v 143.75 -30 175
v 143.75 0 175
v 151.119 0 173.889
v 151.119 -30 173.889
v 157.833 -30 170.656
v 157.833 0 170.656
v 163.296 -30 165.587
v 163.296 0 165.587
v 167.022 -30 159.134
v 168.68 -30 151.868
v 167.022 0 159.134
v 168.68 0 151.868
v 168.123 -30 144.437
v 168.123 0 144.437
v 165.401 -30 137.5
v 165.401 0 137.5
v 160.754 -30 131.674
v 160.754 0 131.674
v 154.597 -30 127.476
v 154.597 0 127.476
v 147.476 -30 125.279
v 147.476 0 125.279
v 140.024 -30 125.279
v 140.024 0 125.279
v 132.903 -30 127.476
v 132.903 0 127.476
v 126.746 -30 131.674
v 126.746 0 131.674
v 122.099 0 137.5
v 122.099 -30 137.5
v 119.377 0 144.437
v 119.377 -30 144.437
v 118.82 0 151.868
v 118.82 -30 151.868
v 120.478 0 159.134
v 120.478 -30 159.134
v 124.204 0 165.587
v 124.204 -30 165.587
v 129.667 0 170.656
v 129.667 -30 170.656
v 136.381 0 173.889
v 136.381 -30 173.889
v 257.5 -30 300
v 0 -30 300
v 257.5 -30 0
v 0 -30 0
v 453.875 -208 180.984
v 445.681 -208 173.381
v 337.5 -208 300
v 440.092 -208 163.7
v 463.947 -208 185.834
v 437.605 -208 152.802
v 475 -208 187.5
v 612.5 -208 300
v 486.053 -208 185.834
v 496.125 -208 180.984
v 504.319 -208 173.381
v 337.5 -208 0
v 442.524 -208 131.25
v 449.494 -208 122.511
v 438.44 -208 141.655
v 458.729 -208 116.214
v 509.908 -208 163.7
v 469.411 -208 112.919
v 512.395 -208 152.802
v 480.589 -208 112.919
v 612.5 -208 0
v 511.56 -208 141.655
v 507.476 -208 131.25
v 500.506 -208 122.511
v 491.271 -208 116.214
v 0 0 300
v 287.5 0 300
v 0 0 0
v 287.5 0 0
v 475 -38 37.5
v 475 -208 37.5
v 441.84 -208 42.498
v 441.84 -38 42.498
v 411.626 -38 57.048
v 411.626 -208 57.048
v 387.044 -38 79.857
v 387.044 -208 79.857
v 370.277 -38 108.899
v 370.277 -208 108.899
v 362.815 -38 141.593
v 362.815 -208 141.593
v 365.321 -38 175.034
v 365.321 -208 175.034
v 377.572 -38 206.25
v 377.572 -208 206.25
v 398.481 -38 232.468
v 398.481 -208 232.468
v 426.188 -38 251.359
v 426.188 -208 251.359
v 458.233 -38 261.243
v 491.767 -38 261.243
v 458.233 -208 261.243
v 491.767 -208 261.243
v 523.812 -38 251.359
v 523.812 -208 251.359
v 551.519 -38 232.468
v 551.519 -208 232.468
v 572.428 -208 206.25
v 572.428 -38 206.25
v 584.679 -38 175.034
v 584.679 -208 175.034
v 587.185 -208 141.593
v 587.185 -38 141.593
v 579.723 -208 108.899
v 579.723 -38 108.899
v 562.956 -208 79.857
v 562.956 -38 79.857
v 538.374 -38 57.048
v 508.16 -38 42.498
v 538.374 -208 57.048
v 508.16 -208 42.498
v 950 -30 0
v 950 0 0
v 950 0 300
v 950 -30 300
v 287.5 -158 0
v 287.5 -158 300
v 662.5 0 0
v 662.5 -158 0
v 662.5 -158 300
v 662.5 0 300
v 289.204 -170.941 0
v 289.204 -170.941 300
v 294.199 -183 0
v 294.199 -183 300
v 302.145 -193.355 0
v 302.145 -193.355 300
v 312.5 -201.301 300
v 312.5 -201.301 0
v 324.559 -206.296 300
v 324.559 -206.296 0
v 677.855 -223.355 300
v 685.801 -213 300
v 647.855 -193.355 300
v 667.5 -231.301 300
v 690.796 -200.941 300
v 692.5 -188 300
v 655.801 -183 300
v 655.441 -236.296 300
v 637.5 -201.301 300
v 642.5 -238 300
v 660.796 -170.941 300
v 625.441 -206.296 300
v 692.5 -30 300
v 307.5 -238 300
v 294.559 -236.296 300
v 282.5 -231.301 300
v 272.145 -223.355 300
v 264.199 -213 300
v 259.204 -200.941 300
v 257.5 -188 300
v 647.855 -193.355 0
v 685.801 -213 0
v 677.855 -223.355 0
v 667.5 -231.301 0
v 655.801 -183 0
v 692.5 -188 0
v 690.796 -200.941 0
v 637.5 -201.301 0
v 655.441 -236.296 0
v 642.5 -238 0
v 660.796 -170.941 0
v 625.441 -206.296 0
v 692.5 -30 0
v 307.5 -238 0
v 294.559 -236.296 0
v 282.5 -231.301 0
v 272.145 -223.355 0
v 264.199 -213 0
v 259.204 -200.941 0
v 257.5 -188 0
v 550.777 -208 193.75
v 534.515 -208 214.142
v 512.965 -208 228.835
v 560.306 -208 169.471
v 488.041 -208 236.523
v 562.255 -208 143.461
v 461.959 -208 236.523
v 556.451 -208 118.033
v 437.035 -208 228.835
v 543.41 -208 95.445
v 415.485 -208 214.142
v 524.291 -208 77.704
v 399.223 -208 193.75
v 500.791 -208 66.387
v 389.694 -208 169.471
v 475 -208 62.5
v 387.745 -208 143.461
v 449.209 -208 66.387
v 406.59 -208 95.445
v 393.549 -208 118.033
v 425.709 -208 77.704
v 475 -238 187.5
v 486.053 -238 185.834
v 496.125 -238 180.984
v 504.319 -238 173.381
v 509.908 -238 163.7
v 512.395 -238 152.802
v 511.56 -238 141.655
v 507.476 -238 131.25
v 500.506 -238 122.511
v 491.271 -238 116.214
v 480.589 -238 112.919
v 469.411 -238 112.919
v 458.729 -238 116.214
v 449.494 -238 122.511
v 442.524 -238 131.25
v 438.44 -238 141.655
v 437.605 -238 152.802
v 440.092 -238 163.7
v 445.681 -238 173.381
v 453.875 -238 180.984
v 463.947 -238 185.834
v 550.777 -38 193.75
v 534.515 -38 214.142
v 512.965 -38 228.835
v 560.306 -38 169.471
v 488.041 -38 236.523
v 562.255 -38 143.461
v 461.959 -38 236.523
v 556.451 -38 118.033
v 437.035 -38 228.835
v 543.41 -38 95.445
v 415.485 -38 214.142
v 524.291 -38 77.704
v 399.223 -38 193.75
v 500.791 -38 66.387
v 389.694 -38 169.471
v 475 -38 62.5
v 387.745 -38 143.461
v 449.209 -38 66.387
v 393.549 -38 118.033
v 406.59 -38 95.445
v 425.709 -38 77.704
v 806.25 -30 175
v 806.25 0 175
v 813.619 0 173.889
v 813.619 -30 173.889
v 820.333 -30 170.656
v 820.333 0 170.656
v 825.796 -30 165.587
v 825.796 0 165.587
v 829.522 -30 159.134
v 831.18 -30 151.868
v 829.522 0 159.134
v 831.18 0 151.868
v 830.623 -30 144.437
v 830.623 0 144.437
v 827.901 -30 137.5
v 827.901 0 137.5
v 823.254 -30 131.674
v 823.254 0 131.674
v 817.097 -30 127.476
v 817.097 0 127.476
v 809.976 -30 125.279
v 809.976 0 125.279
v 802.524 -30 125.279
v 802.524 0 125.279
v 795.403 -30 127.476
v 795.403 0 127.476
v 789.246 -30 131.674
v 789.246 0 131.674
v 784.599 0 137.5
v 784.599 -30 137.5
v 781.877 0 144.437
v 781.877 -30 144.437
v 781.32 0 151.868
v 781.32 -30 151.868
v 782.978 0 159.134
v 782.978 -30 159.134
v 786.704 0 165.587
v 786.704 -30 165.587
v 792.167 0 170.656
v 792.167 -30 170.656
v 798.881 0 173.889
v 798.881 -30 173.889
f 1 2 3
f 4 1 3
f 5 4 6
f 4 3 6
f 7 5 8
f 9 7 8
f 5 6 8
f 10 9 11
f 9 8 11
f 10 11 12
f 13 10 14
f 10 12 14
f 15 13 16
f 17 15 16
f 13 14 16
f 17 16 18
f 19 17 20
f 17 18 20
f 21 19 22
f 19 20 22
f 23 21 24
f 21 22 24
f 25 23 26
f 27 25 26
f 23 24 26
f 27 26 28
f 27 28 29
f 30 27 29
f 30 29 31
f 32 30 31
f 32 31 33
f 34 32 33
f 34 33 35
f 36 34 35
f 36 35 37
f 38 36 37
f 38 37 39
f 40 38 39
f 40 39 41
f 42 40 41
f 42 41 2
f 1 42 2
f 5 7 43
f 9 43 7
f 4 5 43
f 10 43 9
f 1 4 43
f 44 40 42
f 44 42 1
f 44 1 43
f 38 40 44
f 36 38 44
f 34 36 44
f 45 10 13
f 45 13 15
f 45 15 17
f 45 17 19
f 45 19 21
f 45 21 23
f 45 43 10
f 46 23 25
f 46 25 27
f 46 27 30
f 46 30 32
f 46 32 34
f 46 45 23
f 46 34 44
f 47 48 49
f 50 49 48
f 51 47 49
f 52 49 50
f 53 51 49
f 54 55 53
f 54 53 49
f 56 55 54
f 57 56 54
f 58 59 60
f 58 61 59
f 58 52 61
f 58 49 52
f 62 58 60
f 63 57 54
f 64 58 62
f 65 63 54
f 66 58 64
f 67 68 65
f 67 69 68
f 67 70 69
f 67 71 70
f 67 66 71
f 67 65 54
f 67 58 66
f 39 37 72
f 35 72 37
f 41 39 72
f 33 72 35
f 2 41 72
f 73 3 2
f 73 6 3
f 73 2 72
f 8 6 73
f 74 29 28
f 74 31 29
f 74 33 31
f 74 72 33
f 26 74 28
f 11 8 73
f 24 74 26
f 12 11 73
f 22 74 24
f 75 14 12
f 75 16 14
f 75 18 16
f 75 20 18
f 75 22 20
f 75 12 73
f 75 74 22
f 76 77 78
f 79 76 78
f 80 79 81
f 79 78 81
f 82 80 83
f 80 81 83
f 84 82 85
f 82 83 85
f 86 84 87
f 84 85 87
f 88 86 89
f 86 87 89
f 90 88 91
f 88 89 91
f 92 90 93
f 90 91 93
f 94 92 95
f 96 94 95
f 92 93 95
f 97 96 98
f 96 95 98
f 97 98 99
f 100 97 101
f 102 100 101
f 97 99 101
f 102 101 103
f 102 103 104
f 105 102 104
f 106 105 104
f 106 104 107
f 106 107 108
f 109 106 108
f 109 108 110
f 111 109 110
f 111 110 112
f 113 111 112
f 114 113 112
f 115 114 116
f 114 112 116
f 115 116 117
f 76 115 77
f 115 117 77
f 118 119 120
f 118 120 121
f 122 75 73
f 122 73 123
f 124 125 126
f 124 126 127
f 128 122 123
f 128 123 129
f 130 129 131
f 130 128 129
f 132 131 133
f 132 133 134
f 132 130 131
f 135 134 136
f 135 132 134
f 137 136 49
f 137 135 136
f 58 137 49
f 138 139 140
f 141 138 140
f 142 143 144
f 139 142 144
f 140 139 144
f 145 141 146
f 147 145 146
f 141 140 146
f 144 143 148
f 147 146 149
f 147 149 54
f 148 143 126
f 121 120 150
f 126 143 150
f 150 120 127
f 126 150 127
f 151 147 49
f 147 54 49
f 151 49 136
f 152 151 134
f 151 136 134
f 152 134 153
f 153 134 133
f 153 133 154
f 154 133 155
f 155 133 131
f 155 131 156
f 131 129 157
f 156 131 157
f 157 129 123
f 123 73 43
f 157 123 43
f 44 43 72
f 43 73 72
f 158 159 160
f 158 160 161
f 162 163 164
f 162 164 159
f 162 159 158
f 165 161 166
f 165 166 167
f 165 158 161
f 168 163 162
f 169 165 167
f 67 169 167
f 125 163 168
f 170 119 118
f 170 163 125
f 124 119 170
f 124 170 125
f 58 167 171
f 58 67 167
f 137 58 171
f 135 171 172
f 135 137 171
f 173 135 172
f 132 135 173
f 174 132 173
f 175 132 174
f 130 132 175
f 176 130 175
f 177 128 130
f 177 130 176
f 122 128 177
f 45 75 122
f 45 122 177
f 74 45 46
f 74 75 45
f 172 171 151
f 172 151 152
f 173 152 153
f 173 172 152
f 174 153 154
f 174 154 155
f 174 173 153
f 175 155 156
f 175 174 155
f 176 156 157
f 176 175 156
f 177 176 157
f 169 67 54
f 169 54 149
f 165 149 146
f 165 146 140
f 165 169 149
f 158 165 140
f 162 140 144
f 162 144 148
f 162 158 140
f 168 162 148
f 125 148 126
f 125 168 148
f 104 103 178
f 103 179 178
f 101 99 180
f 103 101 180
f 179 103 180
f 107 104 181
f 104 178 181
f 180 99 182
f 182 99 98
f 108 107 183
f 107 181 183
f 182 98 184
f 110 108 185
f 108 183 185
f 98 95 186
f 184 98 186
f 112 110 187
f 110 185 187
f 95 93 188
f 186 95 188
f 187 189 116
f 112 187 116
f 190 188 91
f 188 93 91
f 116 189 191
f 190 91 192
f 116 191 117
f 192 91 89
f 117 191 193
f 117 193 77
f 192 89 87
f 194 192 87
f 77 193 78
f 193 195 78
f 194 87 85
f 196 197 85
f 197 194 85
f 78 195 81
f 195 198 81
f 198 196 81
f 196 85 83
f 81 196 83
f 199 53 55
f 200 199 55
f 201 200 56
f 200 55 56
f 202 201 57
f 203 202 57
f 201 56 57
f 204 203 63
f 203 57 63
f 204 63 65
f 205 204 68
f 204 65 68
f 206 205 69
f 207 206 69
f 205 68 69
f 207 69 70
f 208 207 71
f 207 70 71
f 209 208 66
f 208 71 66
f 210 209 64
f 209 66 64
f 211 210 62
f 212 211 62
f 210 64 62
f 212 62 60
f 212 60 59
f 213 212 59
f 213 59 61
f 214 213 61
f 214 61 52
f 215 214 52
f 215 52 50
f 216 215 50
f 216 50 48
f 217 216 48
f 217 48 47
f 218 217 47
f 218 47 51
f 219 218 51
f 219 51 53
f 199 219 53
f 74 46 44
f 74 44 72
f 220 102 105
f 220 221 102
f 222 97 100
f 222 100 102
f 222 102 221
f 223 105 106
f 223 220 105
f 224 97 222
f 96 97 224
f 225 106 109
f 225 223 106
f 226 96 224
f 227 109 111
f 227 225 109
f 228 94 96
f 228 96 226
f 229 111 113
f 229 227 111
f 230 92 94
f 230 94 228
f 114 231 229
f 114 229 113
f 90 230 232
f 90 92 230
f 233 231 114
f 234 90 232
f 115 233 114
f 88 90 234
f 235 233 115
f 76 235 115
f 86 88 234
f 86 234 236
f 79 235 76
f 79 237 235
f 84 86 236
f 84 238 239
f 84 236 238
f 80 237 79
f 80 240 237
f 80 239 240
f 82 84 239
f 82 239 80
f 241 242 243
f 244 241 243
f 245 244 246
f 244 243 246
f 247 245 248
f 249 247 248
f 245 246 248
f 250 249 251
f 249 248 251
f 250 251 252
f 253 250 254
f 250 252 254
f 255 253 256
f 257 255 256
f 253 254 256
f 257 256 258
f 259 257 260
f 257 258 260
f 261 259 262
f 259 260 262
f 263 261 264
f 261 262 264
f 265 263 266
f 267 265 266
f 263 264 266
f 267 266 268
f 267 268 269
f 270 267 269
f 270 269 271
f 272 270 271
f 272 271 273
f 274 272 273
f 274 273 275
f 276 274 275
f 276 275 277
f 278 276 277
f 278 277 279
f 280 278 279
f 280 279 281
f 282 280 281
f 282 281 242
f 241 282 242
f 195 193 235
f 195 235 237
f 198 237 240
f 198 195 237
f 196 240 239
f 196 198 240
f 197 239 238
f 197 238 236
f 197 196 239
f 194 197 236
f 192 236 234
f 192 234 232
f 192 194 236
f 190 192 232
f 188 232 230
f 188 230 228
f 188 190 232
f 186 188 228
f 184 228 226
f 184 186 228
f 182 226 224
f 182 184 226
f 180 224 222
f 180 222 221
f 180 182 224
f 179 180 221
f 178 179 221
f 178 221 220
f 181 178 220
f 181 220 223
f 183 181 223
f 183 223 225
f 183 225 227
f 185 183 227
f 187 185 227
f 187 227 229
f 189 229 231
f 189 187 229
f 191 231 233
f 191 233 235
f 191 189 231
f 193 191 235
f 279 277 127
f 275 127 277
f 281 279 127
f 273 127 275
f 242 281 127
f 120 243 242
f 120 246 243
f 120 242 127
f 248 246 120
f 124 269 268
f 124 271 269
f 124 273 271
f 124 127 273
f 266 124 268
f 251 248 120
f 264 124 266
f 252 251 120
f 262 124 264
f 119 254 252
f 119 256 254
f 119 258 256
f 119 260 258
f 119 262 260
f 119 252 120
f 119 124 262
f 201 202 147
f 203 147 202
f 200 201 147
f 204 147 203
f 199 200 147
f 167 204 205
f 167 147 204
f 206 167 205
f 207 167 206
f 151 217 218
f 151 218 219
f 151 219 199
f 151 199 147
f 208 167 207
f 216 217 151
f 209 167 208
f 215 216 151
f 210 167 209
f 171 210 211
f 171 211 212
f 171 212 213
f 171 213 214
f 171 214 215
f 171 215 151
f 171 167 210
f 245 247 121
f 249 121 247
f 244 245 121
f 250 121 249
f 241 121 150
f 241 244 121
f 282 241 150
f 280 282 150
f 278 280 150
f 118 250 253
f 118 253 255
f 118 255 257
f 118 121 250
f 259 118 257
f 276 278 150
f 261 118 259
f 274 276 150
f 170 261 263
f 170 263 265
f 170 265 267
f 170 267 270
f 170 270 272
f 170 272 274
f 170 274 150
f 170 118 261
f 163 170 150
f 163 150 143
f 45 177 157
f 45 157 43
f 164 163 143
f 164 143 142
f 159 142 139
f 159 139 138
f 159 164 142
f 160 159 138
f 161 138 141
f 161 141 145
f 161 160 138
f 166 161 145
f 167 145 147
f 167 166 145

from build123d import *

# Parameters (mm, degrees)
BOSS_EXTRUDE1_DEPTH = 300
SKETCH3_R           = 25
CUT_EXTRUDE1_DEPTH  = 1025.277306202
BOSS_EXTRUDE2_START = -208
SKETCH3_3_R         = 112.5
SKETCH3_3_R_2       = 87.5
BOSS_EXTRUDE2_DEPTH = 170
SKETCH3_6_R         = 37.5
CUT_EXTRUDE2_DEPTH  = 1025.277306202


with BuildPart() as part:
    # Sketch1 → Boss-Extrude1 (new body)
    with BuildSketch(Plane.XY):
        with BuildLine():
            Line((0, 0), (287.5, 0))
            Line((287.5, 0), (287.5, -158))
            ThreePointArc((287.5, -158), (302.144660941, -193.355339059), (337.5, -208))
            Line((337.5, -208), (612.5, -208))
            ThreePointArc((612.5, -208), (647.855339059, -193.355339059), (662.5, -158))
            Line((662.5, -158), (662.5, 0))
            Line((662.5, 0), (950, 0))
            Line((950, 0), (950, -30))
            Line((950, -30), (692.5, -30))
            Line((692.5, -30), (692.5, -188))
            ThreePointArc((692.5, -188), (677.855339059, -223.355339059), (642.5, -238))
            Line((642.5, -238), (307.5, -238))
            ThreePointArc((307.5, -238), (272.144660941, -223.355339059), (257.5, -188))
            Line((257.5, -188), (257.5, -30))
            Line((257.5, -30), (0, -30))
            Line((0, -30), (0, 0))
        make_face()
    extrude(amount=BOSS_EXTRUDE1_DEPTH)

    # Sketch3 → Cut-Extrude1 (cut, through all)
    with BuildSketch(Plane(origin=(0, 0, 0), x_dir=(1, 0, 0), z_dir=(0, 1, 0))):
        with Locations(Location((143.75, -150, 0), (0, 0, 270))):
            Circle(SKETCH3_R)
        with Locations(Location((806.25, -150, 0), (0, 0, 270))):
            Circle(SKETCH3_R)
    extrude(amount=-CUT_EXTRUDE1_DEPTH, mode=Mode.SUBTRACT)

    # Sketch3<6> → Cut-Extrude2 (cut, through all)
    with BuildSketch(Plane(origin=(0, 0, 0), x_dir=(1, 0, 0), z_dir=(0, 1, 0))):
        with Locations(Location((475, -150, 0), (0, 0, 270))):
            Circle(SKETCH3_6_R)
    extrude(amount=-CUT_EXTRUDE2_DEPTH, mode=Mode.SUBTRACT)


with BuildPart() as body_2:
    # Sketch3<3> → Boss-Extrude2 (new body)
    with BuildSketch(Plane(origin=(0, 0, 0), x_dir=(1, 0, 0), z_dir=(0, 1, 0)).offset(BOSS_EXTRUDE2_START)):
        with Locations(Location((475, -150, 0), (0, 0, 90))):
            Circle(SKETCH3_3_R)
        with Locations(Location((475, -150, 0), (0, 0, 90))):
            Circle(SKETCH3_3_R_2, mode=Mode.SUBTRACT)
    extrude(amount=BOSS_EXTRUDE2_DEPTH)


solid = Compound([part.part, body_2.part])
